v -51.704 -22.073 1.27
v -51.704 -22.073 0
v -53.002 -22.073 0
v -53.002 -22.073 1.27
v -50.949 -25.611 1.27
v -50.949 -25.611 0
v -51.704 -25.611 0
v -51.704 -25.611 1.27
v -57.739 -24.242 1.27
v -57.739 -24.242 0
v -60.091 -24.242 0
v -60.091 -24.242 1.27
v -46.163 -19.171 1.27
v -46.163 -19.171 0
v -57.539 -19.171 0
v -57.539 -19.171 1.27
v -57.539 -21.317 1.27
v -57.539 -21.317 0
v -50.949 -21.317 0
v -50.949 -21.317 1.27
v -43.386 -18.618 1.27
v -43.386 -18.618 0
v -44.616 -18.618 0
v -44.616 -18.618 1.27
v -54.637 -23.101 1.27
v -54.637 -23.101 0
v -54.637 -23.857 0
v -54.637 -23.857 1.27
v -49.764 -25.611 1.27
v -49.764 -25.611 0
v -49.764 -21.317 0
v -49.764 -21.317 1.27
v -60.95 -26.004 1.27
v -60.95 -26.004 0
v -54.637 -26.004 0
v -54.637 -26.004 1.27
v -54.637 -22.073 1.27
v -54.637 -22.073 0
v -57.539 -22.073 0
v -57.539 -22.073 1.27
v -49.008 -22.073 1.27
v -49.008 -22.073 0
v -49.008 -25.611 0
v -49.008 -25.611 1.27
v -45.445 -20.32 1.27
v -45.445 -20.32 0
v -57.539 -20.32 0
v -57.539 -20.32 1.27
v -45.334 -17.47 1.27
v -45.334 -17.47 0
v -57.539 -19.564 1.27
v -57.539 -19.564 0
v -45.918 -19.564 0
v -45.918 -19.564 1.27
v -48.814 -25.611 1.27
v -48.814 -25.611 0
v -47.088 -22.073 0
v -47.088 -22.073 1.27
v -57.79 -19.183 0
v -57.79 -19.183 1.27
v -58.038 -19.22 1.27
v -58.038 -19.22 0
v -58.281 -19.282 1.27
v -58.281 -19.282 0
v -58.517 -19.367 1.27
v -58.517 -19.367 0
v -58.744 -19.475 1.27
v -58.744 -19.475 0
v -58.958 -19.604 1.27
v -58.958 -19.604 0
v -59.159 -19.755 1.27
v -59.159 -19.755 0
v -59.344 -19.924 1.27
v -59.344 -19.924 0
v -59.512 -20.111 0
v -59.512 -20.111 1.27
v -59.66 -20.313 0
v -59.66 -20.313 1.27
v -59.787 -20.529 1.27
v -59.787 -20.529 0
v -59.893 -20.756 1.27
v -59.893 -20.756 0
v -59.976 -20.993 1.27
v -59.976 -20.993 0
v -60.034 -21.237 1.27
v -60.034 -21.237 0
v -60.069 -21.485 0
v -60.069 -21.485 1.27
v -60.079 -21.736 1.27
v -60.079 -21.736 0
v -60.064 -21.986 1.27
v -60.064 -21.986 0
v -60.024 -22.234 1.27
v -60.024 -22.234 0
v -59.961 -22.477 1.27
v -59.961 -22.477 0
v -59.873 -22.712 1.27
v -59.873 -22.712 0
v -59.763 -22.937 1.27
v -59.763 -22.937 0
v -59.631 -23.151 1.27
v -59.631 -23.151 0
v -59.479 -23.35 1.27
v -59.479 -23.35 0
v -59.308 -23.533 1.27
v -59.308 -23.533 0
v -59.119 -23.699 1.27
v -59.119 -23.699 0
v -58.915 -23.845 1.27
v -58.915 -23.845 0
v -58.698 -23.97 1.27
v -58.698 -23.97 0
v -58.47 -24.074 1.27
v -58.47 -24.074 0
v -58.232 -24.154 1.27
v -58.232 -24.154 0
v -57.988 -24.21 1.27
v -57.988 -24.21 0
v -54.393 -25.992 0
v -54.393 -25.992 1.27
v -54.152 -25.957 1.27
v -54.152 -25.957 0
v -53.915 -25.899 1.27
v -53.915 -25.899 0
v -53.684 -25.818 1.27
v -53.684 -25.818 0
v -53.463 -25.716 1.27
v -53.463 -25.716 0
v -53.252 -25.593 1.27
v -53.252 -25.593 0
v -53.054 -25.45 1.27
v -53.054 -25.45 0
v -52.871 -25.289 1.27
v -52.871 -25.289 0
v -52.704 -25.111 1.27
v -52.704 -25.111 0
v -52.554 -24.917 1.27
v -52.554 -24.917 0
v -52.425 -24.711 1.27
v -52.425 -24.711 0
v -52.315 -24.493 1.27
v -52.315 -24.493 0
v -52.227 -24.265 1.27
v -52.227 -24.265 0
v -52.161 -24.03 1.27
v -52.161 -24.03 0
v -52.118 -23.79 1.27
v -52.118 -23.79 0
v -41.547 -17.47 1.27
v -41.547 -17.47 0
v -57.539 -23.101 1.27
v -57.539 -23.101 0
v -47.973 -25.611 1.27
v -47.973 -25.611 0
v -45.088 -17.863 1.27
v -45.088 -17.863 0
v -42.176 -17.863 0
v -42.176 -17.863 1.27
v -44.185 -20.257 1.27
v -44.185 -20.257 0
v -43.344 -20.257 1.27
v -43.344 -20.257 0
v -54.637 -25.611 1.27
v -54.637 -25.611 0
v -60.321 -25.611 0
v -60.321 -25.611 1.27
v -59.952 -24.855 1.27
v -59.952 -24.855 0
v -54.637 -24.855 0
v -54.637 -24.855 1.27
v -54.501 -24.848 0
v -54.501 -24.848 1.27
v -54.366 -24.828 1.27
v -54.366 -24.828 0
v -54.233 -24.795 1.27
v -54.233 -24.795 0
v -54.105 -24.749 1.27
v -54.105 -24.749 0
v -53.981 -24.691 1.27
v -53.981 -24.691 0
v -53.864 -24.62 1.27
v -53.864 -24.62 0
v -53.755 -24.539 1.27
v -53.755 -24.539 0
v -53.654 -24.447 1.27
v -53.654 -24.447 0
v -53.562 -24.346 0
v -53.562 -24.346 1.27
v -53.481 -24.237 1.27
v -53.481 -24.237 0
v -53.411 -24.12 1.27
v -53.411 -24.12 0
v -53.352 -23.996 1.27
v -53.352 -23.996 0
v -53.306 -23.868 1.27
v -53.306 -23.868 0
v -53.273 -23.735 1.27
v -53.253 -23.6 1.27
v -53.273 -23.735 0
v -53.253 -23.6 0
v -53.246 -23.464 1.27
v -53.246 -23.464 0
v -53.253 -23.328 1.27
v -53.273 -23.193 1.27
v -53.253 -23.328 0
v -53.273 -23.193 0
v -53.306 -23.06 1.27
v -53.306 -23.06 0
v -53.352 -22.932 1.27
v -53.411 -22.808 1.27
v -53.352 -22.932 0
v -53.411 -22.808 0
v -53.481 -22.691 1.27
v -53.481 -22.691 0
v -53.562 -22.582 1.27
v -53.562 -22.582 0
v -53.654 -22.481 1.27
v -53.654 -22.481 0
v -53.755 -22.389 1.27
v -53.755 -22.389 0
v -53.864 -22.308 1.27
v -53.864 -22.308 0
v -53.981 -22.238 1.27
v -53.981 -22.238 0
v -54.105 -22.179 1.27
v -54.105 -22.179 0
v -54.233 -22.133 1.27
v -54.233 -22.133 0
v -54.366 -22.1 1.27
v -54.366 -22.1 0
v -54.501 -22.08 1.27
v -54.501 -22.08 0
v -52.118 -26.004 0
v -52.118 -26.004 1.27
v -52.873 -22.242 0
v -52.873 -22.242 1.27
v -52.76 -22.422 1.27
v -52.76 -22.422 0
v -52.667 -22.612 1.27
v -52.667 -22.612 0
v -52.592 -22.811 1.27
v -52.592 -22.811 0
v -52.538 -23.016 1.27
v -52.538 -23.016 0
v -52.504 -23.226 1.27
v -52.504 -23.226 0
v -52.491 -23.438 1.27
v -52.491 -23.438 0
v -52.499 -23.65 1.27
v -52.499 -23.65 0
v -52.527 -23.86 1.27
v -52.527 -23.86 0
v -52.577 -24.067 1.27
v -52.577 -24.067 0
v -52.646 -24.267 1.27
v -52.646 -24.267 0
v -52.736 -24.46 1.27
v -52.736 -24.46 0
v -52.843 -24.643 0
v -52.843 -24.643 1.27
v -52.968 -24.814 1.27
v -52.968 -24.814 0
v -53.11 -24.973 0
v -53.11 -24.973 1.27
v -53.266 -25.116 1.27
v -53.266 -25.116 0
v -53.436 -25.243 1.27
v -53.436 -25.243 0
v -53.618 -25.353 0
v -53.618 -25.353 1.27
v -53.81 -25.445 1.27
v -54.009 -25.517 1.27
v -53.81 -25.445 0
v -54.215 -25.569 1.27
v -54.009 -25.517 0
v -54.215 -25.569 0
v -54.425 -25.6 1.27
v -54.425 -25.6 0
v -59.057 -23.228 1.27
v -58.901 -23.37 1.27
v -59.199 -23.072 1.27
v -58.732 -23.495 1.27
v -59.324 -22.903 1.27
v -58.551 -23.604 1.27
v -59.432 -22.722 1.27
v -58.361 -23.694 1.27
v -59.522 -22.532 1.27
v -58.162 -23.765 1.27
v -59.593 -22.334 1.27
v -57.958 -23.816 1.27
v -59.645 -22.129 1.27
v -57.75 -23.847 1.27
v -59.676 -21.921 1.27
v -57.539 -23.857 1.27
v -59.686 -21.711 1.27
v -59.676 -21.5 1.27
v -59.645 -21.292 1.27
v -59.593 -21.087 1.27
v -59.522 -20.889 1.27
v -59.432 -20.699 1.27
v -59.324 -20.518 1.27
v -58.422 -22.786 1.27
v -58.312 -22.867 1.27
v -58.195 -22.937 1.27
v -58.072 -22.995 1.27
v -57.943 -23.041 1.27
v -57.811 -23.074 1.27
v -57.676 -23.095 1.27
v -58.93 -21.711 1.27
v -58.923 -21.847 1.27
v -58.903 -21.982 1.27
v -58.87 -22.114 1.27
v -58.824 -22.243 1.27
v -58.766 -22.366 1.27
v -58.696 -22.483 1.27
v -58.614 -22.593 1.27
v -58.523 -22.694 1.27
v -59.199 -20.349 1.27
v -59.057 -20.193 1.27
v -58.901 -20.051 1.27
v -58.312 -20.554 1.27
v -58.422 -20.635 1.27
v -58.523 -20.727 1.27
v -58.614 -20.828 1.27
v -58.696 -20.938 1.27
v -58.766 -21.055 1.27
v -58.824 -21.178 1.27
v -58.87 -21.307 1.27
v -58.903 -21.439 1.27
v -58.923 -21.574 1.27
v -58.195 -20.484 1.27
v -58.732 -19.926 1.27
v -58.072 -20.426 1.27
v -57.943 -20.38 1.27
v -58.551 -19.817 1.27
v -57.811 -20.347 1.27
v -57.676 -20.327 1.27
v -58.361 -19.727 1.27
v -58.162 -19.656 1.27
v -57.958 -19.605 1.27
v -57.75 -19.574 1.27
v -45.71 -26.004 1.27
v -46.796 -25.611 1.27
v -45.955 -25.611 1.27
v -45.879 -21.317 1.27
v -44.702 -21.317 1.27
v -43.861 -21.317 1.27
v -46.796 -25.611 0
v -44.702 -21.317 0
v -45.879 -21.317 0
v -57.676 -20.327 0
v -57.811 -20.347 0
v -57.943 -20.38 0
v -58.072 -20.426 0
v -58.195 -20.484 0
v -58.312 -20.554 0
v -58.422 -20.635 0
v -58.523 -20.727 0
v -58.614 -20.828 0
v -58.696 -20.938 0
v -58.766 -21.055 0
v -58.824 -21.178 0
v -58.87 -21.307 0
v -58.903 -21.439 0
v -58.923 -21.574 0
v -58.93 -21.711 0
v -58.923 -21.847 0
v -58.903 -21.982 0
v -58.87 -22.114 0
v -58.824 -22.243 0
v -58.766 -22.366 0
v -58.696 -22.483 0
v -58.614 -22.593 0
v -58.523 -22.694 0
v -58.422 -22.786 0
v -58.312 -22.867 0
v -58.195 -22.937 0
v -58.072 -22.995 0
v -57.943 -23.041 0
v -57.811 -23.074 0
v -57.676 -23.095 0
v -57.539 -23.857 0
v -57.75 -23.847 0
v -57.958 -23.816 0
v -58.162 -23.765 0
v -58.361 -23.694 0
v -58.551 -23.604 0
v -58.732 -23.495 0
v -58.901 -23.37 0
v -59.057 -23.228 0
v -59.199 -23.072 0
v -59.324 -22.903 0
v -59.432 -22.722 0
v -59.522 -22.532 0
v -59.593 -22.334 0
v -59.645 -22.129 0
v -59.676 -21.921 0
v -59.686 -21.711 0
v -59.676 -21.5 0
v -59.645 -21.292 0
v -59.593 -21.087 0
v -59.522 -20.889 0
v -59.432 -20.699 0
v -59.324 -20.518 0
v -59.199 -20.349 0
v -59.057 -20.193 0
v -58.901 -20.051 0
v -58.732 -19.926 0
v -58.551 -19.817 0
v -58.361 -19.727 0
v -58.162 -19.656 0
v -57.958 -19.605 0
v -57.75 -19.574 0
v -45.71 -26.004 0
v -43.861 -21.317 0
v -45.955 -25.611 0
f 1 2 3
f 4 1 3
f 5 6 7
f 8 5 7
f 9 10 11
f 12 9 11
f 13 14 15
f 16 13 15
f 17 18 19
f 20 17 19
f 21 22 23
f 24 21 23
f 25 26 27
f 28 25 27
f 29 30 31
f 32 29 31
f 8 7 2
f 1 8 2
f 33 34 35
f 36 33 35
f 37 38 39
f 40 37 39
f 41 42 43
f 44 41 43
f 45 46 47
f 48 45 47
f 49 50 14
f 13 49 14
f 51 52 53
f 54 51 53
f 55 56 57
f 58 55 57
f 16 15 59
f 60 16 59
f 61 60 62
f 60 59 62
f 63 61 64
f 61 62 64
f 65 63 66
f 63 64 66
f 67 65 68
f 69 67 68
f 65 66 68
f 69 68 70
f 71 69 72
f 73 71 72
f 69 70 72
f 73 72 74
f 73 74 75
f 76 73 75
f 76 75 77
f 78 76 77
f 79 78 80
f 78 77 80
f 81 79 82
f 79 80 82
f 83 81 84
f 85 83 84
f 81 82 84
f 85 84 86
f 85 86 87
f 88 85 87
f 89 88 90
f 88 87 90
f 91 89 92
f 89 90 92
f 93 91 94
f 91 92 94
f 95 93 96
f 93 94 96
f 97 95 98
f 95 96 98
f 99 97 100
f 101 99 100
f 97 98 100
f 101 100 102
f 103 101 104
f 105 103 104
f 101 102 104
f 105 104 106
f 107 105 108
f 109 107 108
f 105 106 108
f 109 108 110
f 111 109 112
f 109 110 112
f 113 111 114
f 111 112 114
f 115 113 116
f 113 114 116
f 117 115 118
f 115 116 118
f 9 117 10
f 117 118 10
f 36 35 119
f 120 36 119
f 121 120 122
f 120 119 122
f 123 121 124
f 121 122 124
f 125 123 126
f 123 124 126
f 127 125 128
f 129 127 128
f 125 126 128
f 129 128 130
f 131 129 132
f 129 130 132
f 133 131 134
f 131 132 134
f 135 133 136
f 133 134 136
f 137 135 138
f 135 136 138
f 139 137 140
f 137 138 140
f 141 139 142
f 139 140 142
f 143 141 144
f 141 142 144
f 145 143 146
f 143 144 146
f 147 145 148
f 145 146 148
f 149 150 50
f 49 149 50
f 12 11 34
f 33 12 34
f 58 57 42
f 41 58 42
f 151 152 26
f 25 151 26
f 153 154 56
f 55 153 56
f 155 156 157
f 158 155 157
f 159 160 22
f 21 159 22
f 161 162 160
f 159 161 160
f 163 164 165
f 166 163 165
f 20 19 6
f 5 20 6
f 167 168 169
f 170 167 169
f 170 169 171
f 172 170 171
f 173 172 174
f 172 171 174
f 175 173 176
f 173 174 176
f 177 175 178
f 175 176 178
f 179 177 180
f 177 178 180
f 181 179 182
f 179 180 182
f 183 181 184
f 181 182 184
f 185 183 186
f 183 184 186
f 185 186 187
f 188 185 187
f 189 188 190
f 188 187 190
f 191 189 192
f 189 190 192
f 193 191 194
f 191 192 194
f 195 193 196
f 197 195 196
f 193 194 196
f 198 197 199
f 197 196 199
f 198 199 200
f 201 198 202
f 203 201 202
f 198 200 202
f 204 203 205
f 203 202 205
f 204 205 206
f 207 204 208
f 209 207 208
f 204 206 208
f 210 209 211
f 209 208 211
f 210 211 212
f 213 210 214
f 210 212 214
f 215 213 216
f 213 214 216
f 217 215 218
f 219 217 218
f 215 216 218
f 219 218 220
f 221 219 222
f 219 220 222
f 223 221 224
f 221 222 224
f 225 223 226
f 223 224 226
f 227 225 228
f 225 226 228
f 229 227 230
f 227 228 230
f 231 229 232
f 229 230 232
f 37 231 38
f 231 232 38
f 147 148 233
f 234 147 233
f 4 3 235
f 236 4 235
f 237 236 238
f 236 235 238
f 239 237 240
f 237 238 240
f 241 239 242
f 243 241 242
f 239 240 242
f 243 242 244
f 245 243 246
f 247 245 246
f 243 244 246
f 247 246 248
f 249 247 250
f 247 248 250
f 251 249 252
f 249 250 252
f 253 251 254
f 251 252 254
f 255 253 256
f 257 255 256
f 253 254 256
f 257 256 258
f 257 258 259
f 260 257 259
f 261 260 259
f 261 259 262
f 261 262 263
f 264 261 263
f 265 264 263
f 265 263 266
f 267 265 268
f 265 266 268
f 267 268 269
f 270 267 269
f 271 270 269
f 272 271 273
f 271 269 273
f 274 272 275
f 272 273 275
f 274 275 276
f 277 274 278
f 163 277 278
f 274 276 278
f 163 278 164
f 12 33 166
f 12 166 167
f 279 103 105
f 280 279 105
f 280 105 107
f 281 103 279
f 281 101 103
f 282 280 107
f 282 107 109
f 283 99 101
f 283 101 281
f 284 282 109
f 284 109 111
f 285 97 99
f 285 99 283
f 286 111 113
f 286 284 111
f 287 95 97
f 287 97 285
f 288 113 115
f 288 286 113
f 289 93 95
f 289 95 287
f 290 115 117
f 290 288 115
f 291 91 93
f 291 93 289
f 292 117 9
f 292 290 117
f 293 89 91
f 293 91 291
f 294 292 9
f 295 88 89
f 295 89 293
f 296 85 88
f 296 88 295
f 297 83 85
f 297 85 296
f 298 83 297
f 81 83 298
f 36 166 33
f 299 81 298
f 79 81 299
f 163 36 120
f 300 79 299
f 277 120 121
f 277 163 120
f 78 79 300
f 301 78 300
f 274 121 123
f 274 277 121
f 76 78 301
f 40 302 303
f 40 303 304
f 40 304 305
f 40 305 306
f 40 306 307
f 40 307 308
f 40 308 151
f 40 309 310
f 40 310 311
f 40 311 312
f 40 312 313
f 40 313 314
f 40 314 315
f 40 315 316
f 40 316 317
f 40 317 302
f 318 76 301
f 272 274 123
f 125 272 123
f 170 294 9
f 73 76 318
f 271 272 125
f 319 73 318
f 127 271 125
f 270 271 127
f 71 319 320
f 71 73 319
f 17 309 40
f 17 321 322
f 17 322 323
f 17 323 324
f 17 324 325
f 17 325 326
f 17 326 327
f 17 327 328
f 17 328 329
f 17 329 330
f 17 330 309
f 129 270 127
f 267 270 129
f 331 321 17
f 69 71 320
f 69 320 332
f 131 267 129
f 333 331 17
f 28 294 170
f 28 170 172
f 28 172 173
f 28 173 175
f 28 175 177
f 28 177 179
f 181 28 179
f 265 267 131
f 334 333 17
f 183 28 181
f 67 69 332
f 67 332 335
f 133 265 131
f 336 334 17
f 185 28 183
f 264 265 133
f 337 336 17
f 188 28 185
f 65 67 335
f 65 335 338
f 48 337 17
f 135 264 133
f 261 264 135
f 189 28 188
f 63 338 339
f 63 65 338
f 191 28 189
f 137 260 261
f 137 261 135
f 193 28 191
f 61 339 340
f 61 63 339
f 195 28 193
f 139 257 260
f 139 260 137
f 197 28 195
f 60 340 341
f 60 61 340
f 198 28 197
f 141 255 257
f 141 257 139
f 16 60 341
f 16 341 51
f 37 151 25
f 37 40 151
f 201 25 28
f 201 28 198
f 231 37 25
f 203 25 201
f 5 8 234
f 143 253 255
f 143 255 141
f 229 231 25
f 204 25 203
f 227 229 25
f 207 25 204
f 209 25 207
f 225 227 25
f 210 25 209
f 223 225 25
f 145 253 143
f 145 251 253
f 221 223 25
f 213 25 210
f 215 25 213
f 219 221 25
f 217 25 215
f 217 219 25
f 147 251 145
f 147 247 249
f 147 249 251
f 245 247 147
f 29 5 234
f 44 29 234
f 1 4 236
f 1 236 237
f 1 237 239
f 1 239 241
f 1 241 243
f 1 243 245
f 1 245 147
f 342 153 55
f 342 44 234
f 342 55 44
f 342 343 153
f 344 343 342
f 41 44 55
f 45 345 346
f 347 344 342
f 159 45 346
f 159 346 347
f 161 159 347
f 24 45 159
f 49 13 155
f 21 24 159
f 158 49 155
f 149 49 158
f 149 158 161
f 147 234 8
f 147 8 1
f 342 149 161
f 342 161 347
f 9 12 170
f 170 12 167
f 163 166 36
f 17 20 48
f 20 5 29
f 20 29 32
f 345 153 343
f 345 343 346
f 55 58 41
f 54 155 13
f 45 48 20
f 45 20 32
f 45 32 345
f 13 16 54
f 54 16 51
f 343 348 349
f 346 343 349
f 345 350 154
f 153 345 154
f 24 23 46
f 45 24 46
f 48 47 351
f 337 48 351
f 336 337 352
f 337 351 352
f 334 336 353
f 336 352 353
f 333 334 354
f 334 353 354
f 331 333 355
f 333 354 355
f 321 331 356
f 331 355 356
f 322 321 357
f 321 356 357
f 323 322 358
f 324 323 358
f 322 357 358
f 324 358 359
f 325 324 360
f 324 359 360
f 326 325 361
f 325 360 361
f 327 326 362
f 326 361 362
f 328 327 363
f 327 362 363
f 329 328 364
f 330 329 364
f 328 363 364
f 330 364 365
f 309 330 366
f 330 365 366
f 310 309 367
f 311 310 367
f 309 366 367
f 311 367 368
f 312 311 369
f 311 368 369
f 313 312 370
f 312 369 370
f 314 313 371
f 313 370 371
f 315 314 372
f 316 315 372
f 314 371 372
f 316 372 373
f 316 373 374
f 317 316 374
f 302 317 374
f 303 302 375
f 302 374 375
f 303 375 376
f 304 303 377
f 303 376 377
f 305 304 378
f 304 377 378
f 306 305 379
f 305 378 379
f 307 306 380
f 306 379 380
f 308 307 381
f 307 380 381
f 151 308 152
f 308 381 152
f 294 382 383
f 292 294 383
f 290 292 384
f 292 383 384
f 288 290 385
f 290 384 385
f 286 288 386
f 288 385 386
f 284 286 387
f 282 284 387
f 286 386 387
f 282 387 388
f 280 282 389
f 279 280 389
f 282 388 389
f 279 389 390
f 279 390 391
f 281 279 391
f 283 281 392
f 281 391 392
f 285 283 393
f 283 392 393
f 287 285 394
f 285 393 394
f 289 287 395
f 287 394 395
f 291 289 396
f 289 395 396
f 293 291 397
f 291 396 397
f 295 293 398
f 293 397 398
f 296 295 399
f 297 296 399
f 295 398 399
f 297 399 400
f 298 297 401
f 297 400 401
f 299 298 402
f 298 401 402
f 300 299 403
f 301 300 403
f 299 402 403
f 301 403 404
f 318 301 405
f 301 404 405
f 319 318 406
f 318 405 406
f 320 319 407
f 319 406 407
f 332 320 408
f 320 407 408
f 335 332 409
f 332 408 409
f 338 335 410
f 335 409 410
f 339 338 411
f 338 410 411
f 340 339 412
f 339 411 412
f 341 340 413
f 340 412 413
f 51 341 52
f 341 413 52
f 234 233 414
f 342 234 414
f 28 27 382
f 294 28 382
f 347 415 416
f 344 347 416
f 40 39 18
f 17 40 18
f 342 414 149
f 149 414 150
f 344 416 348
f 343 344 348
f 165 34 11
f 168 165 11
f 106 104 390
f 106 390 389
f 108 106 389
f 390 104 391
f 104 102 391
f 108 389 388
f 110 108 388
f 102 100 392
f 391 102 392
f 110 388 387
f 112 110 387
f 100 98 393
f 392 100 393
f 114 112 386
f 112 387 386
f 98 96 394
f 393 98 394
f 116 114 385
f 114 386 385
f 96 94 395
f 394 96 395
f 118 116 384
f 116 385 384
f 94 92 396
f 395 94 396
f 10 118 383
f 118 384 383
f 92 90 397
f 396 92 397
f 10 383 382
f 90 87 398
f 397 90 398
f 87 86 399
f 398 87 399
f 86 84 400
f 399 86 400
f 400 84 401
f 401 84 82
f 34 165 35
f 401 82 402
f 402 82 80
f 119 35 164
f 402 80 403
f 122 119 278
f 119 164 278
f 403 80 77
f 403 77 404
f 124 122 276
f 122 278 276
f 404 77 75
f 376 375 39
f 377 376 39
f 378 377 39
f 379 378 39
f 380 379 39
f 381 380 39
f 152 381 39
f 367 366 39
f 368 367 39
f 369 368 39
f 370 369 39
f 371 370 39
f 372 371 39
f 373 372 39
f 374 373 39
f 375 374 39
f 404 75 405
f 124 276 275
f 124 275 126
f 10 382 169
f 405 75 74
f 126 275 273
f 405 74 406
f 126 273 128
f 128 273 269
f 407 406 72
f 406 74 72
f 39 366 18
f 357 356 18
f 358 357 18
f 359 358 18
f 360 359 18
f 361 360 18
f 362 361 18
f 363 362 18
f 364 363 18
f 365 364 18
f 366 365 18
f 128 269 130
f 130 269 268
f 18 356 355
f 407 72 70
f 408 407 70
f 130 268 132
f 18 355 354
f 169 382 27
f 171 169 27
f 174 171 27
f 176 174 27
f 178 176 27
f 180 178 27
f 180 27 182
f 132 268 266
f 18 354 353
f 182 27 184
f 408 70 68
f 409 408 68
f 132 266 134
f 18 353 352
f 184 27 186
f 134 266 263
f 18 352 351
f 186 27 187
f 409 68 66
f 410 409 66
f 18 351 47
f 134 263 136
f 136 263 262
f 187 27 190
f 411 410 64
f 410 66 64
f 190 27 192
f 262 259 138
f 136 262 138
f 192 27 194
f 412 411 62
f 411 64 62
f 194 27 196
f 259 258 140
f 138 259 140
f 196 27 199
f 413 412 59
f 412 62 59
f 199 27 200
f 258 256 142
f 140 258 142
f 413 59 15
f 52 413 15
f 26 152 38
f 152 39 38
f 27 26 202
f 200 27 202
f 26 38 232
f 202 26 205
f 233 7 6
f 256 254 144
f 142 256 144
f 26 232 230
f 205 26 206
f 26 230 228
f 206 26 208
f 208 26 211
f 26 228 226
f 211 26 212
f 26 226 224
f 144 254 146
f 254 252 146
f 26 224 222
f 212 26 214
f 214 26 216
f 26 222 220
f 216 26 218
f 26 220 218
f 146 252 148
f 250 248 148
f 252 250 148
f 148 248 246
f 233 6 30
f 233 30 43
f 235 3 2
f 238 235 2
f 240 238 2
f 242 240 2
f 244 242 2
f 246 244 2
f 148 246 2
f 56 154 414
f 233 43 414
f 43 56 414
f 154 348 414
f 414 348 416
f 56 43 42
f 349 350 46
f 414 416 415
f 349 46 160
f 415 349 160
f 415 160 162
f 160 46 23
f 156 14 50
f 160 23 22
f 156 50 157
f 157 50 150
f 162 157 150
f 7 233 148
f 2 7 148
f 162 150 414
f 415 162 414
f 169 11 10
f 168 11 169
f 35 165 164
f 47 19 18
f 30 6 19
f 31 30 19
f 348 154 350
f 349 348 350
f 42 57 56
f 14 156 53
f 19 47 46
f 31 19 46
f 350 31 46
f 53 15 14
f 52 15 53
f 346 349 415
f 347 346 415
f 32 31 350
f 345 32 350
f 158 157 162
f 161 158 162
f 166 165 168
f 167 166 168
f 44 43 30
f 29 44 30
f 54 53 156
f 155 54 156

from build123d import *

# Parameters (mm, degrees)
F1_DEPTH = 1.27


with BuildPart() as f1:
    # F0 (on Top) → F1 (new body)
    with BuildSketch(Plane.XY):
        with BuildLine():
            Line((-60.090681, -24.242216), (-60.949747, -26.003563))
            Line((-60.949747, -26.003563), (-54.63702, -26.003563))
            ThreePointArc((-54.63702, -26.003563), (-52.960343, -25.371386), (-52.118427, -23.789593))
            Line((-52.118427, -23.789593), (-52.118427, -26.003563))
            Line((-52.118427, -26.003563), (-45.709747, -26.003563))
            Line((-45.709747, -26.003563), (-41.547436, -17.46956))
            Line((-41.547436, -17.46956), (-45.333524, -17.46956))
            Line((-45.333524, -17.46956), (-46.163354, -19.170964))
            Line((-46.163354, -19.170964), (-57.539363, -19.170964))
            ThreePointArc((-57.539363, -19.170964), (-60.07695, -21.610687), (-57.738863, -24.242216))
            Line((-57.738863, -24.242216), (-60.090681, -24.242216))
        make_face()
        with BuildLine():
            Line((-54.63702, -25.610537), (-60.320774, -25.610537))
            Line((-60.320774, -25.610537), (-59.952137, -24.854719))
            Line((-59.952137, -24.854719), (-54.63702, -24.854719))
            ThreePointArc((-54.63702, -24.854719), (-53.246314, -23.464013), (-54.63702, -22.073307))
            Line((-54.63702, -22.073307), (-57.539363, -22.073307))
            Line((-57.539363, -22.073307), (-57.539363, -21.317489))
            Line((-57.539363, -21.317489), (-50.948626, -21.317489))
            Line((-50.948626, -21.317489), (-50.948626, -25.610537))
            Line((-50.948626, -25.610537), (-51.704444, -25.610537))
            Line((-51.704444, -25.610537), (-51.704444, -22.073307))
            Line((-51.704444, -22.073307), (-53.001934, -22.073307))
            ThreePointArc((-53.001934, -22.073307), (-52.688591, -24.364675), (-54.63702, -25.610537))
        make_face(mode=Mode.SUBTRACT)
        Polygon((-49.007684, -25.610537), (-49.763502, -25.610537), (-49.763502, -21.317489), (-45.878878, -21.317489), (-47.972738, -25.610537), (-48.813663, -25.610537), (-47.08844, -22.073307), (-49.007684, -22.073307), align=None, mode=Mode.SUBTRACT)
        Polygon((-45.955337, -25.610537), (-46.796262, -25.610537), (-44.702402, -21.317489), (-43.861477, -21.317489), align=None, mode=Mode.SUBTRACT)
        with BuildLine():
            Line((-54.63702, -23.10122), (-54.63702, -23.857039))
            Line((-54.63702, -23.857039), (-57.539363, -23.857039))
            ThreePointArc((-57.539363, -23.857039), (-59.685887, -21.710514), (-57.539363, -19.56399))
            Line((-57.539363, -19.56399), (-45.917764, -19.56399))
            Line((-45.917764, -19.56399), (-45.087934, -17.862586))
            Line((-45.087934, -17.862586), (-42.176408, -17.862586))
            Line((-42.176408, -17.862586), (-43.344251, -20.257019))
            Line((-43.344251, -20.257019), (-44.185176, -20.257019))
            Line((-44.185176, -20.257019), (-43.38597, -18.618404))
            Line((-43.38597, -18.618404), (-44.615646, -18.618404))
            Line((-44.615646, -18.618404), (-45.445477, -20.319808))
            Line((-45.445477, -20.319808), (-57.539363, -20.319808))
            ThreePointArc((-57.539363, -20.319808), (-58.930069, -21.710514), (-57.539363, -23.10122))
            Line((-57.539363, -23.10122), (-54.63702, -23.10122))
        make_face(mode=Mode.SUBTRACT)
    extrude(amount=F1_DEPTH)


solid = f1.part
